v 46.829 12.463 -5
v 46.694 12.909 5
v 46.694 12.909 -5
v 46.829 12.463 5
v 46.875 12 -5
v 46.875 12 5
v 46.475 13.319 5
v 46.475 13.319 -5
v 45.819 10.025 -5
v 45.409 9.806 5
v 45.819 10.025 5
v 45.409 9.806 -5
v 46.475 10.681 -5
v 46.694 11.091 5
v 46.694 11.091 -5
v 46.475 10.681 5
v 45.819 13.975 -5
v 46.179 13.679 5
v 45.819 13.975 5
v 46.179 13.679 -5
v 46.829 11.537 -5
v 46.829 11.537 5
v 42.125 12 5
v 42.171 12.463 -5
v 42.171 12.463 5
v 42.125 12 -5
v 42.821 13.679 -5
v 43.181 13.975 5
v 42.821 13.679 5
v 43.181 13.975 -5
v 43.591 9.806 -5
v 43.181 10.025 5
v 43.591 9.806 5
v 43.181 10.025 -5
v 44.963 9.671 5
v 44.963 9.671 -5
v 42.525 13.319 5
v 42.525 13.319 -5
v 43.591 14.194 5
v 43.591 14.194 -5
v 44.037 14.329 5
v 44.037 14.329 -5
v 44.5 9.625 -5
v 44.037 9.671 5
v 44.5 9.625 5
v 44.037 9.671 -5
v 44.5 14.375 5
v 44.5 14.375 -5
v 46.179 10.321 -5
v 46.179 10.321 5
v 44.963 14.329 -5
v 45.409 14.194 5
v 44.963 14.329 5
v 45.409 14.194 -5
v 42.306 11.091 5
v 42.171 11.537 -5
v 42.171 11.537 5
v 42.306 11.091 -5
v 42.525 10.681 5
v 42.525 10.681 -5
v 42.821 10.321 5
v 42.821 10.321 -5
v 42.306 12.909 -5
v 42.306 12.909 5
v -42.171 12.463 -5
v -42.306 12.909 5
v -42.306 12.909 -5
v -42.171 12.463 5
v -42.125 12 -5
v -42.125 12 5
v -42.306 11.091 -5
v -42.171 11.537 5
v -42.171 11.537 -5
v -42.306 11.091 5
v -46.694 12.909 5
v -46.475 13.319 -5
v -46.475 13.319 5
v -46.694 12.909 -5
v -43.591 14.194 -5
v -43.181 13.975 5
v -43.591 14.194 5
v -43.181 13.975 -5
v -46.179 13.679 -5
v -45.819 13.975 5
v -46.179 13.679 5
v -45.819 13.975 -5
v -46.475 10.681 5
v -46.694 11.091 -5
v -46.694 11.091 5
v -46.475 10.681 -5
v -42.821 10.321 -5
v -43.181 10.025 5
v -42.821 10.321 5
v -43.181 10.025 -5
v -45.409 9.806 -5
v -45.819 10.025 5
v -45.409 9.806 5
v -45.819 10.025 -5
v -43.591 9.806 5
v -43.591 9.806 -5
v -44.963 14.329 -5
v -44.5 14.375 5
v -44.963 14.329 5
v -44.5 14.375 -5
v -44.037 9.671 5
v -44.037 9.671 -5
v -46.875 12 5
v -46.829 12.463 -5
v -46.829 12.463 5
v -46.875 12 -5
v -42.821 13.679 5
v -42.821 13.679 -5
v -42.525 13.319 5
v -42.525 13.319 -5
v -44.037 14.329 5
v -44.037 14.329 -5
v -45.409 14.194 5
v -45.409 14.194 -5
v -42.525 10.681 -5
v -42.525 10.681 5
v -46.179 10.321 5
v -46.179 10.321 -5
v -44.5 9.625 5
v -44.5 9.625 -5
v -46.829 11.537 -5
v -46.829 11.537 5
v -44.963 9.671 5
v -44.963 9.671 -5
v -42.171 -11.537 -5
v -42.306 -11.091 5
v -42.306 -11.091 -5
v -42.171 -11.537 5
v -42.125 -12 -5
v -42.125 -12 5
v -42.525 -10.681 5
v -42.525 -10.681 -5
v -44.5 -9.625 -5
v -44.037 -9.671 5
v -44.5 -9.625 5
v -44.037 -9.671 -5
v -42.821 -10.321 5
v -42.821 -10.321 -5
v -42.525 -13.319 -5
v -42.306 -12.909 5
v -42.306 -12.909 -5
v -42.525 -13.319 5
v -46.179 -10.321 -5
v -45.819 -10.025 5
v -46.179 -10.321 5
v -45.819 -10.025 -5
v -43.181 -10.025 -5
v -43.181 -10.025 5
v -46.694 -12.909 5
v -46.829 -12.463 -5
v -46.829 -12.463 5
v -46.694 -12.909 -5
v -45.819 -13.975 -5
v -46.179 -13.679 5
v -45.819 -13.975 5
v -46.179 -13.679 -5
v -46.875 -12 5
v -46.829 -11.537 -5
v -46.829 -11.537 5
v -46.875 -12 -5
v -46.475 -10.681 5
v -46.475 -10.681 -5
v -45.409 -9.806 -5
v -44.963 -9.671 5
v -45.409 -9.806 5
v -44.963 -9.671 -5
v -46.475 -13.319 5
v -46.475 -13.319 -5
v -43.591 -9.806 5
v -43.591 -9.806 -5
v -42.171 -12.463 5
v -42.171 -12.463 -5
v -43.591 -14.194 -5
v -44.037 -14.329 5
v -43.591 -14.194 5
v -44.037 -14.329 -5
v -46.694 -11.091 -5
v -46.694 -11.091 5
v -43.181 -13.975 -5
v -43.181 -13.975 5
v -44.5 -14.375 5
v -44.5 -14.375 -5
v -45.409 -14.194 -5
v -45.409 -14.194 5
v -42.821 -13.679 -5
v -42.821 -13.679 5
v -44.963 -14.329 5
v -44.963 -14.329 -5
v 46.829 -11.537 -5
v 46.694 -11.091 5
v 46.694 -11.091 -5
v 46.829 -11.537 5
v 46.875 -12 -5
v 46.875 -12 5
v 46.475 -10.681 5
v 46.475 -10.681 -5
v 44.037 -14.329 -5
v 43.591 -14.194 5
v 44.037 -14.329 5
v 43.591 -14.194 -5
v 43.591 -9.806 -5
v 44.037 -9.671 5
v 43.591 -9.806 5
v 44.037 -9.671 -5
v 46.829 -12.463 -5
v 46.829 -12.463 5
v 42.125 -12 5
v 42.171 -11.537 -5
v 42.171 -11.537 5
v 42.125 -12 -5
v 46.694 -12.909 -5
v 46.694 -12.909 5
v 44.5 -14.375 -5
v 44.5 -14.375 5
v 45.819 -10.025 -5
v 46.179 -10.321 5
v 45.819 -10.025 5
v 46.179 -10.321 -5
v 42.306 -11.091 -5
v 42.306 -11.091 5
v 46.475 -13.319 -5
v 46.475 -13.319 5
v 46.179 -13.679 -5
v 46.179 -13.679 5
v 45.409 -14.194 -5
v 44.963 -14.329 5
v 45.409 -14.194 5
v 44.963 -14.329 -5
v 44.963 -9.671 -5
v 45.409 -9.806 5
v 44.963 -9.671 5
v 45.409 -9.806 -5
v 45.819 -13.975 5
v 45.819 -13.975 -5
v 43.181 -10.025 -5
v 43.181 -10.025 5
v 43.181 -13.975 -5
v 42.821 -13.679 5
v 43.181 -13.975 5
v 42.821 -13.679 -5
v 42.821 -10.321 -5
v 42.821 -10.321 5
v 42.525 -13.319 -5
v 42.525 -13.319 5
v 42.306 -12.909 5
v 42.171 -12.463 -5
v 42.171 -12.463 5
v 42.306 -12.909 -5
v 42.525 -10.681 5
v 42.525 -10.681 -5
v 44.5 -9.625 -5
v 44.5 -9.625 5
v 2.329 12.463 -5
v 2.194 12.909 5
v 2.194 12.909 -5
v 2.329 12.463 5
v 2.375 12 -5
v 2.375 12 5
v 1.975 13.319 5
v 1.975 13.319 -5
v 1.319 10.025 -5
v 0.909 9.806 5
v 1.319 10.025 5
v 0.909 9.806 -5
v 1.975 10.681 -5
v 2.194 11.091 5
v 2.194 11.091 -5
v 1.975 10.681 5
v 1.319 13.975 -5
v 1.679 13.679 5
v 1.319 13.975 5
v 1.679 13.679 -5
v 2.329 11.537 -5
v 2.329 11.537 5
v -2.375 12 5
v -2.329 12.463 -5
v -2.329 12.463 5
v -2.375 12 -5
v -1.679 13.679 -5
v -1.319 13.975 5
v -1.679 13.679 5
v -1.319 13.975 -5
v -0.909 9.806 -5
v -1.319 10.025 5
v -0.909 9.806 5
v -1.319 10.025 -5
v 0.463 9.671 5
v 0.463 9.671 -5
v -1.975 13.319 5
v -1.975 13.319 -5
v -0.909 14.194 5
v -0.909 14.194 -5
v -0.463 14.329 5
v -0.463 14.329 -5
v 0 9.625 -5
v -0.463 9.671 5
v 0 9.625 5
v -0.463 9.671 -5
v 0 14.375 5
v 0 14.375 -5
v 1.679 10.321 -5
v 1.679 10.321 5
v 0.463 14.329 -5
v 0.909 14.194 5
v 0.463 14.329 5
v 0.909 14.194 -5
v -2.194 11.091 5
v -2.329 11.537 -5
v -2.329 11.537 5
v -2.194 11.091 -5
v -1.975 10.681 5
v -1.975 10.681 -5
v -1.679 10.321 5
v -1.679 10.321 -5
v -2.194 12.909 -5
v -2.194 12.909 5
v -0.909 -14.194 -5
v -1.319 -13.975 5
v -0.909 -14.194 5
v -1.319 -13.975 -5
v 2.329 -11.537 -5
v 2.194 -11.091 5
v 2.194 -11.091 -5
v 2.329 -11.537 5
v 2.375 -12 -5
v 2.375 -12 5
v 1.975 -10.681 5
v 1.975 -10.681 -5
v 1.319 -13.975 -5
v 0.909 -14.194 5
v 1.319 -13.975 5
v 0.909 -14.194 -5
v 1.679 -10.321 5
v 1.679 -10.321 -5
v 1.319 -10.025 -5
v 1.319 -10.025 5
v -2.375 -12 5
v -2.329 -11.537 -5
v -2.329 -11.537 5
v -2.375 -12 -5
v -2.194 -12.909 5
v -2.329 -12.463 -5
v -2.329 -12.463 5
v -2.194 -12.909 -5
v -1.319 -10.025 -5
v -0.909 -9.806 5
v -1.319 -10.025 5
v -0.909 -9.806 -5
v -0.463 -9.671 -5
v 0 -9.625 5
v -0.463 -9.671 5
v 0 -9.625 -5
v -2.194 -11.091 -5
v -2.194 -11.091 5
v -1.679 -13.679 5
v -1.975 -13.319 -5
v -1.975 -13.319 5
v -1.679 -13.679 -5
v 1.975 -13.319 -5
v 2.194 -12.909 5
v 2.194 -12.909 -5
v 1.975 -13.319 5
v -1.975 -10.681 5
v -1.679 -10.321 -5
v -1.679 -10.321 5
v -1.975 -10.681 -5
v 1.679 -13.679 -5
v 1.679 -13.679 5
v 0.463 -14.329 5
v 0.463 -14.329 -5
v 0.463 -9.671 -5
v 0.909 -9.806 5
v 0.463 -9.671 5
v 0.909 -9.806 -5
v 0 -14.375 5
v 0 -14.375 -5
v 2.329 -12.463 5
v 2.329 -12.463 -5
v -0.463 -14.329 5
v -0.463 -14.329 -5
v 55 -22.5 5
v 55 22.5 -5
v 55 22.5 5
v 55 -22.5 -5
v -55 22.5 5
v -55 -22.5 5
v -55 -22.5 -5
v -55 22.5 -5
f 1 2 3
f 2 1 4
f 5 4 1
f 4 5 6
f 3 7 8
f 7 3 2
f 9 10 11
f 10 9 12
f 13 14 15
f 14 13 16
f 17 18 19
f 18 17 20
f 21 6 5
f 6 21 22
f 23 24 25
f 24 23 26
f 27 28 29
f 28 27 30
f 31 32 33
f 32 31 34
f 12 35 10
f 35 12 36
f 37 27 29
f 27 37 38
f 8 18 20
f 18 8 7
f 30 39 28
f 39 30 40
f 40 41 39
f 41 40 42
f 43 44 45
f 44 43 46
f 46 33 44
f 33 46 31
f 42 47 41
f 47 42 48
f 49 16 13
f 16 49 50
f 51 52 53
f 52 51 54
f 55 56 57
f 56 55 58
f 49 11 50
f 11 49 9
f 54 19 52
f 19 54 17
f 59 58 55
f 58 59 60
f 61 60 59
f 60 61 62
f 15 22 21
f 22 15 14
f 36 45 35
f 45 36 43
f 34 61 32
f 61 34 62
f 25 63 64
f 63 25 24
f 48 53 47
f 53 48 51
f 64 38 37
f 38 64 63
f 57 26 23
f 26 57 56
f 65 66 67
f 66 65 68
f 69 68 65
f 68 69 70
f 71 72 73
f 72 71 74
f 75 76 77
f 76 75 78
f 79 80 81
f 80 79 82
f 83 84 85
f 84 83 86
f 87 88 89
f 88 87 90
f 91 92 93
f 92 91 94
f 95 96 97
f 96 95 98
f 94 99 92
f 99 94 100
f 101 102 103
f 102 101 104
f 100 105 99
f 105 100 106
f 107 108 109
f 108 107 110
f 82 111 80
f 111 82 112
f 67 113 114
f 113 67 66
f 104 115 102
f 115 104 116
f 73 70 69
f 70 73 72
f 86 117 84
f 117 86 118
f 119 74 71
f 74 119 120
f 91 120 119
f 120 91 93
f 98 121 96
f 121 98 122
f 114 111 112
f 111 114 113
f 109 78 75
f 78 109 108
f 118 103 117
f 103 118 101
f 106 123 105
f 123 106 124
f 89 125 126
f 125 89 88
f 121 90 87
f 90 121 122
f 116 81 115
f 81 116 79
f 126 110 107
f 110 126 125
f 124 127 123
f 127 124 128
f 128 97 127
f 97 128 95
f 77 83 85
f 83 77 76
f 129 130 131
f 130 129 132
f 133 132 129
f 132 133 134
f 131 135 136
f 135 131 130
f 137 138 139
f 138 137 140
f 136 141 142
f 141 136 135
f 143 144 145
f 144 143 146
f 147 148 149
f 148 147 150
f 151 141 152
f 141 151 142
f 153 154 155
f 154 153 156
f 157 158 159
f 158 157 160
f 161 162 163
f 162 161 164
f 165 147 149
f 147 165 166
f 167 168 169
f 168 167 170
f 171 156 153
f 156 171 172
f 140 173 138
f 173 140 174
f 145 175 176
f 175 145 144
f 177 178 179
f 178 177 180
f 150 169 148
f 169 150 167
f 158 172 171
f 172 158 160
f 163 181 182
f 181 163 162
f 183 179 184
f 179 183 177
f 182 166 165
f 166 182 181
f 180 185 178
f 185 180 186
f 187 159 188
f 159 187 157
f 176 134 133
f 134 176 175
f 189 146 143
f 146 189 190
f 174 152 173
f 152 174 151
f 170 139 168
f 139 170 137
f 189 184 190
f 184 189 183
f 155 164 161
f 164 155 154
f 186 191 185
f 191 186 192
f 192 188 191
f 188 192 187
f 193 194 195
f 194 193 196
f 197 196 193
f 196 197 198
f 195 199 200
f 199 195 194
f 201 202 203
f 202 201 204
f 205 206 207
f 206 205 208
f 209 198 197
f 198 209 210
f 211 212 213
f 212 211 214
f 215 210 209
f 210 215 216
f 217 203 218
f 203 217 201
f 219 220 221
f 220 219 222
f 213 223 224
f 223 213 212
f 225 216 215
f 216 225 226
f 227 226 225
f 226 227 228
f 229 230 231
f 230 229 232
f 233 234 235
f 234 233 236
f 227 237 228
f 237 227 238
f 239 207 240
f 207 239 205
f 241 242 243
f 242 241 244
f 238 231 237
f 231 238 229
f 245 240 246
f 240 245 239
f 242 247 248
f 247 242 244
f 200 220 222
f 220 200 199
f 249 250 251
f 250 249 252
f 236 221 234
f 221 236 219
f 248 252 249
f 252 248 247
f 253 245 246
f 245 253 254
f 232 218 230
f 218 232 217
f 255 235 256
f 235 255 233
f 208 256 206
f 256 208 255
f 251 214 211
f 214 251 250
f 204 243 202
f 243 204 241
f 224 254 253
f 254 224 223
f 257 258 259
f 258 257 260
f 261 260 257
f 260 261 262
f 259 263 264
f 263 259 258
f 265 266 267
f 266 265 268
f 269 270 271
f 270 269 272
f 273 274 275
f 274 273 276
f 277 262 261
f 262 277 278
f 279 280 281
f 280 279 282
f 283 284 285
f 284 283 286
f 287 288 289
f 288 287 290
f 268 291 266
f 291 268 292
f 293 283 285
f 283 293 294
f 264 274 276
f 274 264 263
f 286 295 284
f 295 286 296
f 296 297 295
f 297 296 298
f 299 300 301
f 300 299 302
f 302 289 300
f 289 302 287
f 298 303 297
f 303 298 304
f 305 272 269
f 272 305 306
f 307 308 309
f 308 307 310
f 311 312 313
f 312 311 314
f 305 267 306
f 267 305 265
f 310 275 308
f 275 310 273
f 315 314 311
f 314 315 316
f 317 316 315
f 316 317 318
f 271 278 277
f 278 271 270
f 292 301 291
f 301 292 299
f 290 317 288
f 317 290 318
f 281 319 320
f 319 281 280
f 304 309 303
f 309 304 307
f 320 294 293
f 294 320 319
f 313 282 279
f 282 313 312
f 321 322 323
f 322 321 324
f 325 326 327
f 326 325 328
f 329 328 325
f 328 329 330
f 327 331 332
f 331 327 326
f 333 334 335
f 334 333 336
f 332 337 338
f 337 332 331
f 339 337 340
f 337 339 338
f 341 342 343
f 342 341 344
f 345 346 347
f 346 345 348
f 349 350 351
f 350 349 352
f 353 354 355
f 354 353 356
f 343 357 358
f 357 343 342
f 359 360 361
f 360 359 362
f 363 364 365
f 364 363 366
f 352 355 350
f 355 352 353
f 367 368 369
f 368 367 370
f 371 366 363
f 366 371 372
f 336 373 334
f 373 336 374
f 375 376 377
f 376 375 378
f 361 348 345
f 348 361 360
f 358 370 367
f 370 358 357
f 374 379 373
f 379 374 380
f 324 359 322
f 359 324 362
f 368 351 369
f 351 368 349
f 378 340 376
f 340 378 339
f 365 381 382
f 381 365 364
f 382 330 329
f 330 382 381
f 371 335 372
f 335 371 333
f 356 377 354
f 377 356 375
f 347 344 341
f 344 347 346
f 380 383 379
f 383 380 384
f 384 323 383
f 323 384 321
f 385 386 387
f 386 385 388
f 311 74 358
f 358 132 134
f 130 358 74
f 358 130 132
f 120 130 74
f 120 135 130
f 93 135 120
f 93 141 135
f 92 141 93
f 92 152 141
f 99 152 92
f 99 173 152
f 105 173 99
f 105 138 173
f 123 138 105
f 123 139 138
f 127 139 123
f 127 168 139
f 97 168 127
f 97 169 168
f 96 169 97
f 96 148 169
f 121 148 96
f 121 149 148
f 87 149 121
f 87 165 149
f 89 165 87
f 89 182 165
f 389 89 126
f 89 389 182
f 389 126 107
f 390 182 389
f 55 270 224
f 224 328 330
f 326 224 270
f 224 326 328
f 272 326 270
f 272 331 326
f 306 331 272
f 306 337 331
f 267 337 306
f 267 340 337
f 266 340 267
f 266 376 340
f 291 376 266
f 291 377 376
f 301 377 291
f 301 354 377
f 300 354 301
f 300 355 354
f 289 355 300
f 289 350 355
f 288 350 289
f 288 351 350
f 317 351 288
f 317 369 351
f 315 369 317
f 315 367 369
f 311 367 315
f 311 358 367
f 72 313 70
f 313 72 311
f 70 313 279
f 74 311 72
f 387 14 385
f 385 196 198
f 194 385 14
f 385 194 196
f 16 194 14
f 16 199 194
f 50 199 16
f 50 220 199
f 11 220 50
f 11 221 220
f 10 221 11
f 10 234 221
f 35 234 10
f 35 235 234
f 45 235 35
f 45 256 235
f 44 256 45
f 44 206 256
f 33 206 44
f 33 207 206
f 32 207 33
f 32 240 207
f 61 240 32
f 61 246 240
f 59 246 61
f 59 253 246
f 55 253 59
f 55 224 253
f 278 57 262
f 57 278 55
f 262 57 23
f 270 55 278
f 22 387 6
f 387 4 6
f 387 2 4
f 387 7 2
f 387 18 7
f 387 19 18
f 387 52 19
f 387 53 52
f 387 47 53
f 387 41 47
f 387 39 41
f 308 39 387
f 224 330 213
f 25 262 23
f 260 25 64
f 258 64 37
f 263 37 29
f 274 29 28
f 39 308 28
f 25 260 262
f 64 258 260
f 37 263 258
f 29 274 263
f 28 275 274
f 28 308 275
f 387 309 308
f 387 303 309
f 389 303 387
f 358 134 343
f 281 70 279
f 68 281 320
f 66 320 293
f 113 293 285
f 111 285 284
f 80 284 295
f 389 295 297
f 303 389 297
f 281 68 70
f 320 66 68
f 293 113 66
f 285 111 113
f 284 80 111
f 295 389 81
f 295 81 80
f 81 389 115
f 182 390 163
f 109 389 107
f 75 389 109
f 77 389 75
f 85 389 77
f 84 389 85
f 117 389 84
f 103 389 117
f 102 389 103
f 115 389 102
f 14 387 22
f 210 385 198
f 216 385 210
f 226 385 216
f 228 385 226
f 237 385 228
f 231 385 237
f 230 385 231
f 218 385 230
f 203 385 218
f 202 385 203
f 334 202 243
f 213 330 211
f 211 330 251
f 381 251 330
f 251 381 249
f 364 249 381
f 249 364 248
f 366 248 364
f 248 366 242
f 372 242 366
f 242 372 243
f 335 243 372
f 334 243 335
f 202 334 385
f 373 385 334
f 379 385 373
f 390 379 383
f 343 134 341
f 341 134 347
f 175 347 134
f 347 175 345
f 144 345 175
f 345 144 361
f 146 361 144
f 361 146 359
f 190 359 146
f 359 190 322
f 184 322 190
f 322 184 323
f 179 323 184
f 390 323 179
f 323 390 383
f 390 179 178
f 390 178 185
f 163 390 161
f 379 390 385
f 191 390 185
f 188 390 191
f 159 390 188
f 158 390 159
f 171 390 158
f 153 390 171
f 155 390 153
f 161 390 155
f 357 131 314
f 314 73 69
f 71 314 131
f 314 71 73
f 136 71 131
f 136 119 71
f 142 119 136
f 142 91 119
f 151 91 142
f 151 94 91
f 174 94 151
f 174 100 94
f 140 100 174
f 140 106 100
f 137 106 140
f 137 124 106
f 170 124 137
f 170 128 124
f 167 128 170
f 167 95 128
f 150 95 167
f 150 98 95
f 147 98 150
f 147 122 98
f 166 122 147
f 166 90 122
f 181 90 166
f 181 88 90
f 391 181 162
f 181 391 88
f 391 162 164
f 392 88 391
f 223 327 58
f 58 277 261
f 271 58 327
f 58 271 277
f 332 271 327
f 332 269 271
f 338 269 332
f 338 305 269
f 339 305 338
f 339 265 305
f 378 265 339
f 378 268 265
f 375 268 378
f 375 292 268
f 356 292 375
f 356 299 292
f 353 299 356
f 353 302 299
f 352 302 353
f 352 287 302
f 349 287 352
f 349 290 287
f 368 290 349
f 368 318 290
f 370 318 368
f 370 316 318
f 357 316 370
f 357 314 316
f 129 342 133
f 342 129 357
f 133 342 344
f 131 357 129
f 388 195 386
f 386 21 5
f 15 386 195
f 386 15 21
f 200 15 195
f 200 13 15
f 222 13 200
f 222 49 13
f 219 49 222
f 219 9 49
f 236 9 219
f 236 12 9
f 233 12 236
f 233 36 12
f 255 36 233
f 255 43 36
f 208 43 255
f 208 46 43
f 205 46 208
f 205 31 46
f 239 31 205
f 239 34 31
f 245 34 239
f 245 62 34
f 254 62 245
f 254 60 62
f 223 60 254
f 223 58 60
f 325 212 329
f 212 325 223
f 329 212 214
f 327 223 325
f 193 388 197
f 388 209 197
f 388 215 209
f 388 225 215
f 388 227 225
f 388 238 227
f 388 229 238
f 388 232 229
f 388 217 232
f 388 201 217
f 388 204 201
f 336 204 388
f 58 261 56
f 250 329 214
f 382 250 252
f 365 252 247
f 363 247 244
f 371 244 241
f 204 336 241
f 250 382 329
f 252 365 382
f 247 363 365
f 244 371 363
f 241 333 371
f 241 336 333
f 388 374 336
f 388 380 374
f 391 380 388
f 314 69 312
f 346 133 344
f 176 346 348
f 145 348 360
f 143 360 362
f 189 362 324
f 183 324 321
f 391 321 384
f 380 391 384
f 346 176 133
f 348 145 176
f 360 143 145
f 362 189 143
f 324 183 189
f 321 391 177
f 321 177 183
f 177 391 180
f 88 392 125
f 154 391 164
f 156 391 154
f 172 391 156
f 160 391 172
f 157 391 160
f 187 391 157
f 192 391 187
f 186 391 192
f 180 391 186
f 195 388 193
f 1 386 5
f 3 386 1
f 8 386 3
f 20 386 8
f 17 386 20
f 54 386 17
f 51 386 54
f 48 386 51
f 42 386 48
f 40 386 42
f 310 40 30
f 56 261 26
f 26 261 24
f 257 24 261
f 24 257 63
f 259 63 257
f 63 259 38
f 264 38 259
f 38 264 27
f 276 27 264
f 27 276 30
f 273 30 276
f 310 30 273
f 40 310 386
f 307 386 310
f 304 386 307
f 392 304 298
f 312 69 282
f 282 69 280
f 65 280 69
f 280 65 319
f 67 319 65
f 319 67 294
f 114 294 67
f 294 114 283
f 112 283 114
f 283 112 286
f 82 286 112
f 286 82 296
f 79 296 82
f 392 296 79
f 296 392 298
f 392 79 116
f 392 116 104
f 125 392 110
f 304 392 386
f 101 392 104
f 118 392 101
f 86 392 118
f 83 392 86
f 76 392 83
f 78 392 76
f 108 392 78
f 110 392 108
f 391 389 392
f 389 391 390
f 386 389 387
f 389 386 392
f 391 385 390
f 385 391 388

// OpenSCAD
$fn = 32;

// ----------------------------------------------------------------------
// Corner plate 110 x 45 x 10
// 6 holes, centres taken from the edge offset
// ----------------------------------------------------------------------

// --- parameters (mm) ---
plate = [110, 45, 10];   // overall size (x, y, z)
holes = 6;               // number of holes the drawing asks for
bore_d = 4.5;            // nominal hole diameter from the drawing
print_allowance = 0.25;  // clearance added for printing
edge = 10.5;             // hole centre offset from the plate edge

// --- derived feature positions (mm) ---
hole_d = bore_d + print_allowance;  // = 4.75   hole diameter as printed
corner_x = plate[0] / 2 - edge;     // = 44.5   corner hole X
corner_y = plate[1] / 2 - edge;     // = 12   corner hole Y
feature_centers = [
  [corner_x, corner_y],
  [-corner_x, corner_y],
  [-corner_x, -corner_y],
  [corner_x, -corner_y],
  [0, corner_y],
  [0, -corner_y]
];   // hole centres the loop below drills

// plate outline, every hole drilled through with the same cutters
difference() {
  cube(plate, center = true);
  for (centre = feature_centers)
    translate([centre[0], centre[1], 0])
      cylinder(d = hole_d, h = plate[2] + 2, center = true);
}
